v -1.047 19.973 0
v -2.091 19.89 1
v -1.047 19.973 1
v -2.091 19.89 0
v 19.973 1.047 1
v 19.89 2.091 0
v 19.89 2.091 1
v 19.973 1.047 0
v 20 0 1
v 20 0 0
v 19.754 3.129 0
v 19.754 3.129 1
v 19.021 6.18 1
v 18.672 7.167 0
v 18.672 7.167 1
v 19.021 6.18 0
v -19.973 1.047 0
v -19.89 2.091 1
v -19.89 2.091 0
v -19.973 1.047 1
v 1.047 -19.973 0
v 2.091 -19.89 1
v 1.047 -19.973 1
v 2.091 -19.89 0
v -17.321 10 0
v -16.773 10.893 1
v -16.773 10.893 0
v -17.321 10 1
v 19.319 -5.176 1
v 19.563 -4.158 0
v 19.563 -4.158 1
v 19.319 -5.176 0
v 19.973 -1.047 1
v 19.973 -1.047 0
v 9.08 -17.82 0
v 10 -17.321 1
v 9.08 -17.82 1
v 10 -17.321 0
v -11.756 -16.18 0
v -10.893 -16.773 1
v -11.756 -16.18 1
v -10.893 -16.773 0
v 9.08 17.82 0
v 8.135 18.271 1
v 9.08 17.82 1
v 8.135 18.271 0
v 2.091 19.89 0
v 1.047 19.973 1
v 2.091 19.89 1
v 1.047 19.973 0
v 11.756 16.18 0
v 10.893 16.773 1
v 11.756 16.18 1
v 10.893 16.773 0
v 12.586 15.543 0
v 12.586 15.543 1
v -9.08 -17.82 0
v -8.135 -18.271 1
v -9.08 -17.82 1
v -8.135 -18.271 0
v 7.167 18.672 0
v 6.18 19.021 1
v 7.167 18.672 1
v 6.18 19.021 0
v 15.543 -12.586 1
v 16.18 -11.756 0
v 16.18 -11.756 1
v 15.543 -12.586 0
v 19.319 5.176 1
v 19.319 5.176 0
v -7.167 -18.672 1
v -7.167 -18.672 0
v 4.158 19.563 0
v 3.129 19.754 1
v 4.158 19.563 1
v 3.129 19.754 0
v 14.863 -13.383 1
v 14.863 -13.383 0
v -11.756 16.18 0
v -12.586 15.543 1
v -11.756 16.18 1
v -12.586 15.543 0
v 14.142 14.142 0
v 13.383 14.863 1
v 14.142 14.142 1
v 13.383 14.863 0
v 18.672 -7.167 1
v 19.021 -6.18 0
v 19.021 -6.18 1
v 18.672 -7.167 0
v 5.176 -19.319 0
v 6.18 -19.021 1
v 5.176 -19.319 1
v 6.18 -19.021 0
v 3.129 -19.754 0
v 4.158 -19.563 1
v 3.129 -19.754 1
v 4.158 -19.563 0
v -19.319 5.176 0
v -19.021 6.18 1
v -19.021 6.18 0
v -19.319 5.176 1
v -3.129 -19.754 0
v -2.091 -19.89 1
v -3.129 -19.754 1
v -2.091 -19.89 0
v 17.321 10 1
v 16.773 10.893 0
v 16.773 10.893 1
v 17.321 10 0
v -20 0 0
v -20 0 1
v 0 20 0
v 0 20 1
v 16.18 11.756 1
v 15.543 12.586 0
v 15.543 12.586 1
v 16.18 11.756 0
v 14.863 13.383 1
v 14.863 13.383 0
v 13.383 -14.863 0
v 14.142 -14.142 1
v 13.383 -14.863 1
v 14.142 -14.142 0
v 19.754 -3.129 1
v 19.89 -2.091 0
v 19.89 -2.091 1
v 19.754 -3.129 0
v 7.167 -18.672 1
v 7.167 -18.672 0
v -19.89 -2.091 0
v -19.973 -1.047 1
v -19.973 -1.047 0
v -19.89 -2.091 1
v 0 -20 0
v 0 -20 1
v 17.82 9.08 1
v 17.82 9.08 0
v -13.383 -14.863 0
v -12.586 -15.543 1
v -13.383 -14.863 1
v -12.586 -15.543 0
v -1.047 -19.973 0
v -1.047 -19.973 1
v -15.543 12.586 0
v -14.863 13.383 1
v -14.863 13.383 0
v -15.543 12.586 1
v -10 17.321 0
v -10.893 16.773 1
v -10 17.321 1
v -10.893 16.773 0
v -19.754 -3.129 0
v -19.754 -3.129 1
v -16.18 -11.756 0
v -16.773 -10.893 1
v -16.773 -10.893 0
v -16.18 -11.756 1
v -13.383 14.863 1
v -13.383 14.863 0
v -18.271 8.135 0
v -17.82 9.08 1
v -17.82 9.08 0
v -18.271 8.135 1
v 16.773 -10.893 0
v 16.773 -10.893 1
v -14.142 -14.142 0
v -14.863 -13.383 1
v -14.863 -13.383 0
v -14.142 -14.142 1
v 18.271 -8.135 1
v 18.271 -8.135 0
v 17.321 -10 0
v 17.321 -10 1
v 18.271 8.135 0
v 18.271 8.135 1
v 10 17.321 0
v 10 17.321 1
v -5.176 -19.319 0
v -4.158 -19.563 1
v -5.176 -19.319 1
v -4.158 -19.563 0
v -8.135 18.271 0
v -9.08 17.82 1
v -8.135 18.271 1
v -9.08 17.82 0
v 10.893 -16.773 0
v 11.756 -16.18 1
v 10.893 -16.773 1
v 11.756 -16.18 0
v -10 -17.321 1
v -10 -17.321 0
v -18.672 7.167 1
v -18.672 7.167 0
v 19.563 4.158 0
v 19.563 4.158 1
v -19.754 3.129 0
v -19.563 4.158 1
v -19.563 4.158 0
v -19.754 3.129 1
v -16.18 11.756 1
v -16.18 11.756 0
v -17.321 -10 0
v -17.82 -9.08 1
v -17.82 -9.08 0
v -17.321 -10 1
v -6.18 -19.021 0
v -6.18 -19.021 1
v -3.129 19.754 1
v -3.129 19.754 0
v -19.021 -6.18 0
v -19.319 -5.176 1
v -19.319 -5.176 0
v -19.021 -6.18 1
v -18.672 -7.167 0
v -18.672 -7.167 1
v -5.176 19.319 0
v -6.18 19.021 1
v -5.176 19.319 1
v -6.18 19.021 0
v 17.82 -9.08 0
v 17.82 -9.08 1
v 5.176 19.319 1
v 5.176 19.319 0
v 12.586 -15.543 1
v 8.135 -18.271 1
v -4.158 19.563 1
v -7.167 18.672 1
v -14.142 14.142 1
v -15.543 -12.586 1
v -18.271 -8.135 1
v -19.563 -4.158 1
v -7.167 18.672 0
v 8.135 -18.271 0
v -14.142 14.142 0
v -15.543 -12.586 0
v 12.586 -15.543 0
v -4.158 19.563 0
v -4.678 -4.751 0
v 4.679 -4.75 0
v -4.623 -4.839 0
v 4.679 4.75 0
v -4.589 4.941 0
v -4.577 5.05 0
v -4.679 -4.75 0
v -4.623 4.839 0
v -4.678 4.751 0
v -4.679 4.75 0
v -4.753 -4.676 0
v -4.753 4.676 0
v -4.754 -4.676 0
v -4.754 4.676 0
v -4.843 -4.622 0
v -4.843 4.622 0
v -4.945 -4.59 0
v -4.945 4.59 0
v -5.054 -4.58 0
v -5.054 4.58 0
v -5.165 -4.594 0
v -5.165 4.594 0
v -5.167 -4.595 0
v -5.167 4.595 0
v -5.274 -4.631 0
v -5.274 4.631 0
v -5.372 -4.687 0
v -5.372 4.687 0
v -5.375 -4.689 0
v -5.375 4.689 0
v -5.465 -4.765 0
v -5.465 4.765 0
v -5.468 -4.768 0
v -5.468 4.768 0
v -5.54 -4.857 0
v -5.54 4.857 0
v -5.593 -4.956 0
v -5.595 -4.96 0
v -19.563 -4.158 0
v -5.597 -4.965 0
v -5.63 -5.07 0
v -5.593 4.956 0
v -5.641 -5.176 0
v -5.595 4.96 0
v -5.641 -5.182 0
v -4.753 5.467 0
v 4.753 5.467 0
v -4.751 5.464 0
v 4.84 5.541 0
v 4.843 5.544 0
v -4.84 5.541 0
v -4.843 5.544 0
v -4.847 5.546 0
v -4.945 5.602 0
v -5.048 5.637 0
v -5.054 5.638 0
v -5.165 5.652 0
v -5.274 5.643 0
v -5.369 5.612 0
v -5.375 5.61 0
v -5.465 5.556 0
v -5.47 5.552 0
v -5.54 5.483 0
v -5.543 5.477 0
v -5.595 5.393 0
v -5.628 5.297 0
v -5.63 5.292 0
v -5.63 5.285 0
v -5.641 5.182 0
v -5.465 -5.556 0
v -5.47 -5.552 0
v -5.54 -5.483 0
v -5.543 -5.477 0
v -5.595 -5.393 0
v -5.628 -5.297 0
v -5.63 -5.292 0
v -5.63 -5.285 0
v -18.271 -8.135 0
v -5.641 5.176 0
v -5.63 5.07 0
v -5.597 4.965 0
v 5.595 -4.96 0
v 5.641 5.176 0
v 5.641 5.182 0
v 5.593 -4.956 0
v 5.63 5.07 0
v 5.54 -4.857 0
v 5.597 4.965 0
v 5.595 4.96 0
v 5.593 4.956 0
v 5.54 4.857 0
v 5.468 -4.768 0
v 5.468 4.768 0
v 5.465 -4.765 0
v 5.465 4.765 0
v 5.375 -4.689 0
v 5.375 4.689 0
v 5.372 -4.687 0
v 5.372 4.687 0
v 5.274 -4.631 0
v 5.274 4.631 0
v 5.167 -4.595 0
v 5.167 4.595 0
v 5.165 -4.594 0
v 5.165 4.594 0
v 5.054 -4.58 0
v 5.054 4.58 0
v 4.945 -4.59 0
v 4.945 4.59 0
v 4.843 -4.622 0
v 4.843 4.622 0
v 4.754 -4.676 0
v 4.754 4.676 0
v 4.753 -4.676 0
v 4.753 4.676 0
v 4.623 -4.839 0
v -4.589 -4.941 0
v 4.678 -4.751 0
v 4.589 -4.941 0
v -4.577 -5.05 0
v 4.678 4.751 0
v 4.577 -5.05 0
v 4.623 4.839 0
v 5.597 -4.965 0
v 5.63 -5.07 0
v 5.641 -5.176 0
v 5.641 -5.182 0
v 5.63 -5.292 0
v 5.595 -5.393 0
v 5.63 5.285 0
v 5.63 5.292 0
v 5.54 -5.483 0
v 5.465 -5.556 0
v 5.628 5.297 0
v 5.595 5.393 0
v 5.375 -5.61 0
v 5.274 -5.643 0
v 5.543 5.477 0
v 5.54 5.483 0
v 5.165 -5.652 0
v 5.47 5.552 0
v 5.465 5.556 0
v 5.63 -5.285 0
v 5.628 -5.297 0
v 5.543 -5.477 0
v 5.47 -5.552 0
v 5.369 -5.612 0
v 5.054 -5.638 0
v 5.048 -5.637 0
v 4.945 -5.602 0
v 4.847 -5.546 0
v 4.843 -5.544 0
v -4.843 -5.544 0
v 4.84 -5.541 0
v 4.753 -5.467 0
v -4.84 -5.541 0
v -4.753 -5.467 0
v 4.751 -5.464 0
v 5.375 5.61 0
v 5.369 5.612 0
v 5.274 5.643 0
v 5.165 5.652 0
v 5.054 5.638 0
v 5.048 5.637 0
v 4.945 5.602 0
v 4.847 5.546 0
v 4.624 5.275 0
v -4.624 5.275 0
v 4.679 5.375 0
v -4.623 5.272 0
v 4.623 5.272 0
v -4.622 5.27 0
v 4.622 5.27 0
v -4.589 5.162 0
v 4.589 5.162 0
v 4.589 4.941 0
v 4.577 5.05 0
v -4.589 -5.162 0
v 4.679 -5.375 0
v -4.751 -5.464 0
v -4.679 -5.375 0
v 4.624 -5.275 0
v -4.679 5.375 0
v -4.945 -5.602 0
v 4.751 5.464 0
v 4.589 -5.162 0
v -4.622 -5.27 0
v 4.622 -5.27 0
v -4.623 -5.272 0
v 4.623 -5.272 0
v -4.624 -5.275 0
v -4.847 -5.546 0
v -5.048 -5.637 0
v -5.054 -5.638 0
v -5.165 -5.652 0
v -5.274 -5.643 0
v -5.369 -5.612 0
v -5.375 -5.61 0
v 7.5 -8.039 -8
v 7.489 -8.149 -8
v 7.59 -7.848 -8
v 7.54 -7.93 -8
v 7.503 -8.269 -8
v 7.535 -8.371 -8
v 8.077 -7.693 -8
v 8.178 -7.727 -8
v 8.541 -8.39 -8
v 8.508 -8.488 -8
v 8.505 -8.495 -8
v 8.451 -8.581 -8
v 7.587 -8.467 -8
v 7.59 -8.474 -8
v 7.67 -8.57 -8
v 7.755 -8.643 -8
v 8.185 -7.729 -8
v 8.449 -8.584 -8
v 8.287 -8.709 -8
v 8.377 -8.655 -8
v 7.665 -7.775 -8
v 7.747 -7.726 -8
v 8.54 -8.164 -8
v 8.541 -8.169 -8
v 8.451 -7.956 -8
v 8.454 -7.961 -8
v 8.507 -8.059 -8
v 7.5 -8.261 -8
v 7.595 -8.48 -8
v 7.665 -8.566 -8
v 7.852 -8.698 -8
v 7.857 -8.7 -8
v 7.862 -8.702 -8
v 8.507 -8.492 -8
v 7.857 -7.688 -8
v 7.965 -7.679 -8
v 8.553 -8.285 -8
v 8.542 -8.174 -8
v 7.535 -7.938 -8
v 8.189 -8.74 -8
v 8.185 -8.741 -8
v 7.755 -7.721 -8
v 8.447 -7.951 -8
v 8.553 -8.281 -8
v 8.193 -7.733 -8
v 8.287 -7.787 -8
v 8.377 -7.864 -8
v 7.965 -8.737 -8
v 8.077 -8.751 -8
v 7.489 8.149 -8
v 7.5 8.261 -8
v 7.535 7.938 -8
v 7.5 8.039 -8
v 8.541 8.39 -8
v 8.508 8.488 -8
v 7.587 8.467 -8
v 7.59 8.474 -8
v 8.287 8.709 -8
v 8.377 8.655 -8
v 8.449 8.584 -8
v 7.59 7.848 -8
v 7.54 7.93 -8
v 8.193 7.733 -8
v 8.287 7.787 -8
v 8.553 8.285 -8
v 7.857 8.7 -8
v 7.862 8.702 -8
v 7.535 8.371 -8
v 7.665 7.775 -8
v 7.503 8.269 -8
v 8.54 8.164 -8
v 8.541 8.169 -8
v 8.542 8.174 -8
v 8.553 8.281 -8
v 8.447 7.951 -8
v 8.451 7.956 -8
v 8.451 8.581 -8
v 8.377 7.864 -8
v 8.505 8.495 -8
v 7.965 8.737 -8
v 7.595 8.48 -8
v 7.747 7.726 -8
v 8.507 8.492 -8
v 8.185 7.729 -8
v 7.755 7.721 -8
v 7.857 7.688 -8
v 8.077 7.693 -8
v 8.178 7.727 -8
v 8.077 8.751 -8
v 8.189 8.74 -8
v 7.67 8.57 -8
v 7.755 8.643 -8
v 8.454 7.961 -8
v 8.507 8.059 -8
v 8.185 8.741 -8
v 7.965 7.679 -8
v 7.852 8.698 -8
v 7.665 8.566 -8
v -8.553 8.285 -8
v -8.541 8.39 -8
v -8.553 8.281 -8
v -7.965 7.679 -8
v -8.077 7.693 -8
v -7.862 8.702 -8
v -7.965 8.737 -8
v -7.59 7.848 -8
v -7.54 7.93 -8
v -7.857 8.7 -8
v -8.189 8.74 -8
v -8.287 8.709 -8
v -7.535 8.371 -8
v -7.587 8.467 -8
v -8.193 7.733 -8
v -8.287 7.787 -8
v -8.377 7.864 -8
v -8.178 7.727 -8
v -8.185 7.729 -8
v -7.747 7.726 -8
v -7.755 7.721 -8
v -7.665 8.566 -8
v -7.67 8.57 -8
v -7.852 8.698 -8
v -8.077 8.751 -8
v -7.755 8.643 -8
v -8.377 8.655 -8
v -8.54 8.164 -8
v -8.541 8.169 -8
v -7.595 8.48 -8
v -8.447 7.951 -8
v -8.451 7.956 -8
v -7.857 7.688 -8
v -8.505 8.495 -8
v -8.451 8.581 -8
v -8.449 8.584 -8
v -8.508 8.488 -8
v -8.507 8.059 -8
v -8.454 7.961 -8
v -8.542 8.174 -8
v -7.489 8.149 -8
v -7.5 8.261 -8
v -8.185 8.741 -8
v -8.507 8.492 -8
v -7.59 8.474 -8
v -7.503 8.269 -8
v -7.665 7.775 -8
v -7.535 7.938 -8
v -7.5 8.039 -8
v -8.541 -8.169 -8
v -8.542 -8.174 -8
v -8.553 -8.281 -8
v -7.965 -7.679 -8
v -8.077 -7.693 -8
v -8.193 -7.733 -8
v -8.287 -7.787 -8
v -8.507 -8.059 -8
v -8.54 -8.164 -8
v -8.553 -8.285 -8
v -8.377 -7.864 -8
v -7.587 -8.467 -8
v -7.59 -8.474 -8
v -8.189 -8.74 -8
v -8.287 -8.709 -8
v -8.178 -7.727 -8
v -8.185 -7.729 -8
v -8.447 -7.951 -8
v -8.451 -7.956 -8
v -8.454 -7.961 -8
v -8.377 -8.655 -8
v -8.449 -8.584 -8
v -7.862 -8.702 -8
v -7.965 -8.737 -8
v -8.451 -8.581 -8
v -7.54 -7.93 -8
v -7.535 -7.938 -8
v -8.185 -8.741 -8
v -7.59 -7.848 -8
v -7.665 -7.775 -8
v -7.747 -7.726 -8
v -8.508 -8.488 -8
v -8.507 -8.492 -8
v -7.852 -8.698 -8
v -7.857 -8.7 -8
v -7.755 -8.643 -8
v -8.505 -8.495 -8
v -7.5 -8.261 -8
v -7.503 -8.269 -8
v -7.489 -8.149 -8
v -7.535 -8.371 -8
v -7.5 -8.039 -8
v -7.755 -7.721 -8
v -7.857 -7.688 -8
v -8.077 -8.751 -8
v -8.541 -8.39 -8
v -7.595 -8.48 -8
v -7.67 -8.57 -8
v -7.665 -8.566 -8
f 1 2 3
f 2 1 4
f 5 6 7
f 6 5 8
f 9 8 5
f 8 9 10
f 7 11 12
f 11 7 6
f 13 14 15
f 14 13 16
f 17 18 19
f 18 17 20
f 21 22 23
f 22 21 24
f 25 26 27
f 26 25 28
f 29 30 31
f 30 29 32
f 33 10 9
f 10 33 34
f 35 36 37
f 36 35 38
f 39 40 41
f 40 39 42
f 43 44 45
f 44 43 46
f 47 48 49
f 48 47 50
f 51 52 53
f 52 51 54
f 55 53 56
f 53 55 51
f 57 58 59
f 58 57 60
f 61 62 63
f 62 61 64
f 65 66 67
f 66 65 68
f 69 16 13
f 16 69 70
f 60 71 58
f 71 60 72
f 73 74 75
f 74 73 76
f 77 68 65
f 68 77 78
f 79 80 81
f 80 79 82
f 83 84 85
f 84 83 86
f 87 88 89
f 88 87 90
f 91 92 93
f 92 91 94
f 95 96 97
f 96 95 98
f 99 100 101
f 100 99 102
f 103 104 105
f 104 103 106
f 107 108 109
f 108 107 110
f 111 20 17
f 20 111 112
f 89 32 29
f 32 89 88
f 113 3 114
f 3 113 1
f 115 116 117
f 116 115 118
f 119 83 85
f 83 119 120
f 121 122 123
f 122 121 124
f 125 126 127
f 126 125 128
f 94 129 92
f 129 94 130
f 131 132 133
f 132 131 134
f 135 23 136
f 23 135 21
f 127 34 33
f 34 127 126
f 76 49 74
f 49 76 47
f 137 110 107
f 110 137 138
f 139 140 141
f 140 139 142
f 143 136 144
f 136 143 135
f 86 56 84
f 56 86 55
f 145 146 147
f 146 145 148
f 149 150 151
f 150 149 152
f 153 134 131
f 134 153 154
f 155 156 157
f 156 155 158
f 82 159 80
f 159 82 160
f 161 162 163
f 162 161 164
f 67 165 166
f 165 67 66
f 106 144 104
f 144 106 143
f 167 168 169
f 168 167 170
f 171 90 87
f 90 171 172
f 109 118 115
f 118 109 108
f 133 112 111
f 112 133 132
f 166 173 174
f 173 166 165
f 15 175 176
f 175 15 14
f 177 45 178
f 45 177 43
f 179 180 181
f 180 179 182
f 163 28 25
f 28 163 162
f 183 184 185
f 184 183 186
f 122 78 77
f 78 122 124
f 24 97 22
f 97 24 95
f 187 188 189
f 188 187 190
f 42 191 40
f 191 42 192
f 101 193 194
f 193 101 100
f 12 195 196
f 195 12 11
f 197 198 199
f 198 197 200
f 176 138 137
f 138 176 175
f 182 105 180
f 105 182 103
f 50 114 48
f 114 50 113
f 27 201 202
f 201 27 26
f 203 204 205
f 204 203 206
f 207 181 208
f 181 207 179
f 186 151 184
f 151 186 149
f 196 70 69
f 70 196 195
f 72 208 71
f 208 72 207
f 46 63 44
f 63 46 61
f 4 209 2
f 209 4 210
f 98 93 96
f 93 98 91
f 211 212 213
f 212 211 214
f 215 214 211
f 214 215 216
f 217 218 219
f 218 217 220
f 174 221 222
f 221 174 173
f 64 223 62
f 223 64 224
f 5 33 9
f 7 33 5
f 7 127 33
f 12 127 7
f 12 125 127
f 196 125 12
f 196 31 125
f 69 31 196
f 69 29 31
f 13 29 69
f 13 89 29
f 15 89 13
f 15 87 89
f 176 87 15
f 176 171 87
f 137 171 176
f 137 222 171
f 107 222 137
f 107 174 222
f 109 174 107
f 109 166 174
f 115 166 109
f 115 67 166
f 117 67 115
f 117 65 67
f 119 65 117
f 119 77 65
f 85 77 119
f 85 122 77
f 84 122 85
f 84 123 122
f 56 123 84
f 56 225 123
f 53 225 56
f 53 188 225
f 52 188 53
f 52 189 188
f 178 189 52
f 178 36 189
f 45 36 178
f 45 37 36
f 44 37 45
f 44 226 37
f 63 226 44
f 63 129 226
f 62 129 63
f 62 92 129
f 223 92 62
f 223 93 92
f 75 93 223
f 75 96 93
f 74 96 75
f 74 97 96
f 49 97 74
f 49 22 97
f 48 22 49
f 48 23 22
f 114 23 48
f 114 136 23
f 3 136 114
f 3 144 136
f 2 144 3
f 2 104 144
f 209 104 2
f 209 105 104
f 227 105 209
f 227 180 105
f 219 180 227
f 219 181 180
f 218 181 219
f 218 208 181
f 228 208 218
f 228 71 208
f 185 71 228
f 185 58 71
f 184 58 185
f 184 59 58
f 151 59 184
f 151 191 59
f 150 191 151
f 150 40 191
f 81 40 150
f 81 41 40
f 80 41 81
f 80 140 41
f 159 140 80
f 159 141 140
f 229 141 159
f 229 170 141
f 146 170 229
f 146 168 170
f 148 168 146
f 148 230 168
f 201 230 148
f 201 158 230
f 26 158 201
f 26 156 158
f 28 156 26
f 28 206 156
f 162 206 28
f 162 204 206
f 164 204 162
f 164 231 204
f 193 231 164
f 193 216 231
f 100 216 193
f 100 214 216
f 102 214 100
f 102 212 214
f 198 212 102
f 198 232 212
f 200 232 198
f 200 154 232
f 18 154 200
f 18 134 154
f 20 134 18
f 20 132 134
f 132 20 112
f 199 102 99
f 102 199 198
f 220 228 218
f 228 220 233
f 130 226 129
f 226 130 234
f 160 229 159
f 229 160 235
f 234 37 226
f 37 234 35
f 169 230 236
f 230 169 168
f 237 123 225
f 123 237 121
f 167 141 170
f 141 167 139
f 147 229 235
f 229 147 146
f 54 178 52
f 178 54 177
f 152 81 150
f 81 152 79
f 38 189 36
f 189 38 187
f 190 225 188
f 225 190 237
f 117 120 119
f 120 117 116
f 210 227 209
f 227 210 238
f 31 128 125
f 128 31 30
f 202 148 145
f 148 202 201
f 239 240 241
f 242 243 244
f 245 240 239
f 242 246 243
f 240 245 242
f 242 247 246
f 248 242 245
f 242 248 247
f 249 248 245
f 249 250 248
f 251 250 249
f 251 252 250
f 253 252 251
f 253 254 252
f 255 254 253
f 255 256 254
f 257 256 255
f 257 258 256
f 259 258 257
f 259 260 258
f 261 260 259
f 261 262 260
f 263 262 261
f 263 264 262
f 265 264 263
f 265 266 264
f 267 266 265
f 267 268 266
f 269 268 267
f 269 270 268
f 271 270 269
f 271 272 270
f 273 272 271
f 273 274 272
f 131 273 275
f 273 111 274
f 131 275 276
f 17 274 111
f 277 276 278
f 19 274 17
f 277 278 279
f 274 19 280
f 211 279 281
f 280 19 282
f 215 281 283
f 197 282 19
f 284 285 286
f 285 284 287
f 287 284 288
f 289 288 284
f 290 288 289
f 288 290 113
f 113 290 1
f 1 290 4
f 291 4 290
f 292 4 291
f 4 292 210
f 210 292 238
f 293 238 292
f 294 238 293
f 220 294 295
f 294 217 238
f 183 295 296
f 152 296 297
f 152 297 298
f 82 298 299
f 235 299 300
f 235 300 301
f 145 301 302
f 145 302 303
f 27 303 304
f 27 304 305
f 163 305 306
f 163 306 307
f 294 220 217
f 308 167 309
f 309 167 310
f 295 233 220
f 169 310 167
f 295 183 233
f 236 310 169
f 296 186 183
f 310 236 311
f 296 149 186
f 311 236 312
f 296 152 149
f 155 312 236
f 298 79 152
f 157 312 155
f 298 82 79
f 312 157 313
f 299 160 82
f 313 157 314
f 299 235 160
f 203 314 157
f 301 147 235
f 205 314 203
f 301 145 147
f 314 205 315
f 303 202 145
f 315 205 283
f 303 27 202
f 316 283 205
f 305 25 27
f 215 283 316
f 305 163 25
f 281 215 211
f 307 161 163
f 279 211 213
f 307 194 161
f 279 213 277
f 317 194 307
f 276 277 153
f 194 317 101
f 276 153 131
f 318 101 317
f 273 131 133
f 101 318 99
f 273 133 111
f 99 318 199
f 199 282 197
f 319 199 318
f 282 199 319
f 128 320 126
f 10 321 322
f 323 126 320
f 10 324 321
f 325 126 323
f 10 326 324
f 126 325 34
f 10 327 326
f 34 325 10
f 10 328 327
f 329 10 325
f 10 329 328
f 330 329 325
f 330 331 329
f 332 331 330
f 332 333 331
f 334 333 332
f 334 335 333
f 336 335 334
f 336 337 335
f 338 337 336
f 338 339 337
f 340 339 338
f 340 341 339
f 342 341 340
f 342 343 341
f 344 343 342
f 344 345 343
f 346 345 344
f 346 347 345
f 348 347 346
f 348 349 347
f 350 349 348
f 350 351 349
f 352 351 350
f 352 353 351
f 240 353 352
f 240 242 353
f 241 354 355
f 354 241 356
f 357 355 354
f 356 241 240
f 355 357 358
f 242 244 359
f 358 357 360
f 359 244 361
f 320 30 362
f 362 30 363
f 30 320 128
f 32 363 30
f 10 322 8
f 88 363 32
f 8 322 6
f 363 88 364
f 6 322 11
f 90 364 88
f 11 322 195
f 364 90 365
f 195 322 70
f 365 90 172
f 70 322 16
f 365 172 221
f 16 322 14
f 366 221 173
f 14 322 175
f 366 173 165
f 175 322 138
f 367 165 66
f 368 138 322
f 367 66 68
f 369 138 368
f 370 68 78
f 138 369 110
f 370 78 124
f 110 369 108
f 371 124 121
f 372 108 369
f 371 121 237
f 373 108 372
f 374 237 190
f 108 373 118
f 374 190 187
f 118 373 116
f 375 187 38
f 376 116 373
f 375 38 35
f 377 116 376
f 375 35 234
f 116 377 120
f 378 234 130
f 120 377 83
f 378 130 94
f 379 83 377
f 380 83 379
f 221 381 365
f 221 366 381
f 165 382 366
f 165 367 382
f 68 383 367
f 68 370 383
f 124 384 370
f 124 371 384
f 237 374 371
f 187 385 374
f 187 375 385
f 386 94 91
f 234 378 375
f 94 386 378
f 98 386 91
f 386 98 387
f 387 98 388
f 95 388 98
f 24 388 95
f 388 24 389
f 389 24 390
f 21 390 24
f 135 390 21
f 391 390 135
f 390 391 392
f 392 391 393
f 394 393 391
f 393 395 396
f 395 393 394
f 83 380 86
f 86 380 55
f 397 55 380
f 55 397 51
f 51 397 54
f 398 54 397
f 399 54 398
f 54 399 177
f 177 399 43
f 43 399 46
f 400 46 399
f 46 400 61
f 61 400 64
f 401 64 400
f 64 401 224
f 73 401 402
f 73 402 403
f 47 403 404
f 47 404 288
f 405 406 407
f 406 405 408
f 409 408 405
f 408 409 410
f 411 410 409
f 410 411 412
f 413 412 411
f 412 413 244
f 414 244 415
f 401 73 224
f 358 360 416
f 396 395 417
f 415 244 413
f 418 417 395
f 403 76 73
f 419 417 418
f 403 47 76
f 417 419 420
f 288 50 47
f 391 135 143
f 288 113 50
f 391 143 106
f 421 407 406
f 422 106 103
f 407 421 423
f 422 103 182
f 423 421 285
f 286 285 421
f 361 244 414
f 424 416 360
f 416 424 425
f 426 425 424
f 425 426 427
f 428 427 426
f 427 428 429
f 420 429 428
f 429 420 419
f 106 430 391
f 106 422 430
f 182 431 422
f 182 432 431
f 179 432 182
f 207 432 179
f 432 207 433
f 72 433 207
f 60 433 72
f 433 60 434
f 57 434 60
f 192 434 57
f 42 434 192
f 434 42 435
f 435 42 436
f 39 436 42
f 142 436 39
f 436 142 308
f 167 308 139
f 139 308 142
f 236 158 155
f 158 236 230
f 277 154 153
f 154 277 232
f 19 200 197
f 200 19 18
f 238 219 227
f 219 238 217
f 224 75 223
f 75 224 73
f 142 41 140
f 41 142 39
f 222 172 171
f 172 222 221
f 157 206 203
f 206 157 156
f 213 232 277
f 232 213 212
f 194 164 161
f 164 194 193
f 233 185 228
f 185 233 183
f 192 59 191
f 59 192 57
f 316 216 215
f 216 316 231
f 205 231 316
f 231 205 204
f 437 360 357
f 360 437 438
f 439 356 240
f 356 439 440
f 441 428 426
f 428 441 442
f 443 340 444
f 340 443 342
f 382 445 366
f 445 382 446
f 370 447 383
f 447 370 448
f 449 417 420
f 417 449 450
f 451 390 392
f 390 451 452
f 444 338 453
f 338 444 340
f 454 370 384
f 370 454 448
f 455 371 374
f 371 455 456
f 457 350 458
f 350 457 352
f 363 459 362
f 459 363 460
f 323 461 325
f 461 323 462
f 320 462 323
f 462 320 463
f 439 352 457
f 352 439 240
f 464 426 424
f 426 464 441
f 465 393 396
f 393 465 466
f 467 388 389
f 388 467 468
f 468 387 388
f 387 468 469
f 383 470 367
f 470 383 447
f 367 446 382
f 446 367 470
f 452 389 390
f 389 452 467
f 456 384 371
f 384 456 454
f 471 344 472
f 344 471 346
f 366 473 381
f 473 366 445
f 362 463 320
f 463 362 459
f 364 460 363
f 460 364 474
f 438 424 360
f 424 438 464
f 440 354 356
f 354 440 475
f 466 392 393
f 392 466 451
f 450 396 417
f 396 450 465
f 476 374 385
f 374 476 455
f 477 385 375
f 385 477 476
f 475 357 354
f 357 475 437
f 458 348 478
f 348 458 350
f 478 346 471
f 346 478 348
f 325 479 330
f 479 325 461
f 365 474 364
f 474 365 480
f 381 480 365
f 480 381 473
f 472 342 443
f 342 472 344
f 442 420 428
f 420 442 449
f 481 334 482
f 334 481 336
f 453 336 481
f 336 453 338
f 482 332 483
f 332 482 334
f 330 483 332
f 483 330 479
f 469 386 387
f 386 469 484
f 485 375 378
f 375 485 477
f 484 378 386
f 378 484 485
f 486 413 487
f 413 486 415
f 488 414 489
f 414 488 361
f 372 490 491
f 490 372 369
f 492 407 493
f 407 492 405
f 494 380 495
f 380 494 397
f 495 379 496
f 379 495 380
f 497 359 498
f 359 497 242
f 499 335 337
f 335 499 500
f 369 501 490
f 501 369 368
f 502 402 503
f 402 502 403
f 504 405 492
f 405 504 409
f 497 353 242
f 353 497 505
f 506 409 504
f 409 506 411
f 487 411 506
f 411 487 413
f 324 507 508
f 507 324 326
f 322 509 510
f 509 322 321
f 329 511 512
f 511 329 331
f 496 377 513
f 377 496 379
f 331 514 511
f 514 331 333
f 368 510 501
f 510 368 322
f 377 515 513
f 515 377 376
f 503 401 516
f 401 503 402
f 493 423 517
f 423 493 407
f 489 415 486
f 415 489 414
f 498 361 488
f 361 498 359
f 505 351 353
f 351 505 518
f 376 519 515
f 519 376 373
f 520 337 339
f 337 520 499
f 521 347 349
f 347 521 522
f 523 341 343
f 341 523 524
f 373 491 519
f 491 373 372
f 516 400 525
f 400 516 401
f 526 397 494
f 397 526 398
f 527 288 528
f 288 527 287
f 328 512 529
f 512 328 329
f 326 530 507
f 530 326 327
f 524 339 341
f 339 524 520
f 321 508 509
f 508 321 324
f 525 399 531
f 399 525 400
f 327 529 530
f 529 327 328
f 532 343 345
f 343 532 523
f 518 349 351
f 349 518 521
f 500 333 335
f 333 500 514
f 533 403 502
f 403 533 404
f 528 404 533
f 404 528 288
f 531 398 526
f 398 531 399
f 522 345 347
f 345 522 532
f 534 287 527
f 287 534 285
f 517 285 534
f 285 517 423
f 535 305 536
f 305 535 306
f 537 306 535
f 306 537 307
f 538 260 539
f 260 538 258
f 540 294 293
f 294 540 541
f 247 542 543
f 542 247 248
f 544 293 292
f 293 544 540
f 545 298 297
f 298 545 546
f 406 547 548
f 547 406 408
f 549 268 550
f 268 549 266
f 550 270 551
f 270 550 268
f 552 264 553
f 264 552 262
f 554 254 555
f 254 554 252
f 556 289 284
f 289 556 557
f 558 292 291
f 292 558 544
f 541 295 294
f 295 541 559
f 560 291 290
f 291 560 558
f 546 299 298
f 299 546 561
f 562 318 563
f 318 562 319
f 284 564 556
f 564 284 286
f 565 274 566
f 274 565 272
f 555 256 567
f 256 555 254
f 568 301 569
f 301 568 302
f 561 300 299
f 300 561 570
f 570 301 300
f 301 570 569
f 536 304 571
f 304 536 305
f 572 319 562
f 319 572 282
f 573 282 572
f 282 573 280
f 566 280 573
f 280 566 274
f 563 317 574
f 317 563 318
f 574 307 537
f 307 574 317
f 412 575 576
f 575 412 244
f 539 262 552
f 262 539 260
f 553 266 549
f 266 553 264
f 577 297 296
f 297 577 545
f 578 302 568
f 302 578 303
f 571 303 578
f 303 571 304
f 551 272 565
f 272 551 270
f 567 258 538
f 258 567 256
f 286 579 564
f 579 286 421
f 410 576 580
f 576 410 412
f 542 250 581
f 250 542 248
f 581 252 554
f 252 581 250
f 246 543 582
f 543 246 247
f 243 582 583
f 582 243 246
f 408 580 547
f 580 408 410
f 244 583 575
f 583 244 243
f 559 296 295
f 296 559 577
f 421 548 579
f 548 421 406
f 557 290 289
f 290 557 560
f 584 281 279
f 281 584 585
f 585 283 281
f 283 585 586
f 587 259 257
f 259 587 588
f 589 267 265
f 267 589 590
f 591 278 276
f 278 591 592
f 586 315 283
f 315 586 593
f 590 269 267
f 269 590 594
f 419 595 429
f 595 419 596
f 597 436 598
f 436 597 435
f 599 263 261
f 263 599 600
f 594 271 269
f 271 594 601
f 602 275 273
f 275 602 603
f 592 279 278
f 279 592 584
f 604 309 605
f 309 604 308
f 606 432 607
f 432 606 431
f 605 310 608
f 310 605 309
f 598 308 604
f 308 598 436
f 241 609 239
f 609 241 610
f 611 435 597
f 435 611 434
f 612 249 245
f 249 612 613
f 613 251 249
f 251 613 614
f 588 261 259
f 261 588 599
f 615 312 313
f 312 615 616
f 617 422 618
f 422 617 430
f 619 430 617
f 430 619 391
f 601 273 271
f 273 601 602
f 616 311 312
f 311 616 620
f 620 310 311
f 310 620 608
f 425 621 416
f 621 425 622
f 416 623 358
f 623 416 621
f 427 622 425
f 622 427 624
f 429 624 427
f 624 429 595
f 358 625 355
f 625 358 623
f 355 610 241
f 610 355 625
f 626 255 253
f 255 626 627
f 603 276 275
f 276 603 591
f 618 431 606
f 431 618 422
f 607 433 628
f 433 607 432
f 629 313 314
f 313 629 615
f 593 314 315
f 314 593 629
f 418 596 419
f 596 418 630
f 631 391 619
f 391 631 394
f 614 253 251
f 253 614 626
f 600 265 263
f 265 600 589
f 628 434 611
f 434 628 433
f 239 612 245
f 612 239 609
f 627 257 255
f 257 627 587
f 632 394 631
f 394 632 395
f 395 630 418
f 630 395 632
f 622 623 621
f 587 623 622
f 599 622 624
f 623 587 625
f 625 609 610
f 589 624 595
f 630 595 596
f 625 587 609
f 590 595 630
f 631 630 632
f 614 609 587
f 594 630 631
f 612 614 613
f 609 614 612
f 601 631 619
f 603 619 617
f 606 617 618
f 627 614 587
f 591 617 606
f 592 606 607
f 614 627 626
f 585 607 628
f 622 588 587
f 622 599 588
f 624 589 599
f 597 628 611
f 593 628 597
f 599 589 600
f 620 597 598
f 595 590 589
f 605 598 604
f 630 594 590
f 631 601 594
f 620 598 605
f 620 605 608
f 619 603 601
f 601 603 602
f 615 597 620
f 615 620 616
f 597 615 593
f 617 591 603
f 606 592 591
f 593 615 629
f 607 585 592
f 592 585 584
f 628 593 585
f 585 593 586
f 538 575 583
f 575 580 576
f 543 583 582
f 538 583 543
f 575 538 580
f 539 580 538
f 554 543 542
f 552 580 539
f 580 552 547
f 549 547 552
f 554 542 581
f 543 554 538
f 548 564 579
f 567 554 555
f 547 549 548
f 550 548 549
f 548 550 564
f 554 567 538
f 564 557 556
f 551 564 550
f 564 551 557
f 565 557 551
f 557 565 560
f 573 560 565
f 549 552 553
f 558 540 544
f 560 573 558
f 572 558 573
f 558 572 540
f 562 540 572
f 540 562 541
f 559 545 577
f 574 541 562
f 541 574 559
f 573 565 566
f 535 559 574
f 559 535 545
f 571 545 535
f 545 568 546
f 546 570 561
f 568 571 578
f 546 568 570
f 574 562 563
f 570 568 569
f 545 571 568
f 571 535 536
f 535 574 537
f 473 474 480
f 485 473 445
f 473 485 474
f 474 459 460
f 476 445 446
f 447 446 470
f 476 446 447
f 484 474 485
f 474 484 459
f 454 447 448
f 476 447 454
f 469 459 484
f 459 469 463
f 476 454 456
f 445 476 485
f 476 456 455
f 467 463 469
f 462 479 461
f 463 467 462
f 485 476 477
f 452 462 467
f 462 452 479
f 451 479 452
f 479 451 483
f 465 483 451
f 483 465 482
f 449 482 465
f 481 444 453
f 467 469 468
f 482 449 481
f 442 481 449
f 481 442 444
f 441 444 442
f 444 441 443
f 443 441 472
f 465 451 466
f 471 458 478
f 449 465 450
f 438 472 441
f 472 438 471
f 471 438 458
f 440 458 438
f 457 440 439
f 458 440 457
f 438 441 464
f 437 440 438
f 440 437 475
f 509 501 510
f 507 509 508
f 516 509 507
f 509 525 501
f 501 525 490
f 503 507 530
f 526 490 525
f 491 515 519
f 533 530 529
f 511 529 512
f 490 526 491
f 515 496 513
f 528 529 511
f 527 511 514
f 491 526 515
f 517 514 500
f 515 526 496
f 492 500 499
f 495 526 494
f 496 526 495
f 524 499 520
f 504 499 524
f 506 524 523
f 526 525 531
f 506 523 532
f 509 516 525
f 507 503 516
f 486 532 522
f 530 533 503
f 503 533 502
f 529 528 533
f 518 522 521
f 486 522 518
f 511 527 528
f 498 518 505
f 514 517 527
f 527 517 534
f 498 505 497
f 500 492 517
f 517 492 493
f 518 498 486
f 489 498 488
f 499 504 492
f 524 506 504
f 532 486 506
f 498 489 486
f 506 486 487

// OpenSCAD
$fn=30;
difference() {
	union() {
		cylinder(h=1, d=40, $fn=120);
		translate([5, -5, 0.3])
			rotate([20, 160]) cylinder(h=10, d=1);
		translate([5, 5, 0.3])
			rotate([-20, 160]) cylinder(h=10, d=1);
		translate([-5, 5, 0.3])
			rotate([-20, 200]) cylinder(h=10, d=1);
		translate([-5, -5, 0.3])
			rotate([20, 200]) cylinder(h=10, d=1);
	}
	translate([-15, -15, -9]) cube([30, 30, 1]);
}
